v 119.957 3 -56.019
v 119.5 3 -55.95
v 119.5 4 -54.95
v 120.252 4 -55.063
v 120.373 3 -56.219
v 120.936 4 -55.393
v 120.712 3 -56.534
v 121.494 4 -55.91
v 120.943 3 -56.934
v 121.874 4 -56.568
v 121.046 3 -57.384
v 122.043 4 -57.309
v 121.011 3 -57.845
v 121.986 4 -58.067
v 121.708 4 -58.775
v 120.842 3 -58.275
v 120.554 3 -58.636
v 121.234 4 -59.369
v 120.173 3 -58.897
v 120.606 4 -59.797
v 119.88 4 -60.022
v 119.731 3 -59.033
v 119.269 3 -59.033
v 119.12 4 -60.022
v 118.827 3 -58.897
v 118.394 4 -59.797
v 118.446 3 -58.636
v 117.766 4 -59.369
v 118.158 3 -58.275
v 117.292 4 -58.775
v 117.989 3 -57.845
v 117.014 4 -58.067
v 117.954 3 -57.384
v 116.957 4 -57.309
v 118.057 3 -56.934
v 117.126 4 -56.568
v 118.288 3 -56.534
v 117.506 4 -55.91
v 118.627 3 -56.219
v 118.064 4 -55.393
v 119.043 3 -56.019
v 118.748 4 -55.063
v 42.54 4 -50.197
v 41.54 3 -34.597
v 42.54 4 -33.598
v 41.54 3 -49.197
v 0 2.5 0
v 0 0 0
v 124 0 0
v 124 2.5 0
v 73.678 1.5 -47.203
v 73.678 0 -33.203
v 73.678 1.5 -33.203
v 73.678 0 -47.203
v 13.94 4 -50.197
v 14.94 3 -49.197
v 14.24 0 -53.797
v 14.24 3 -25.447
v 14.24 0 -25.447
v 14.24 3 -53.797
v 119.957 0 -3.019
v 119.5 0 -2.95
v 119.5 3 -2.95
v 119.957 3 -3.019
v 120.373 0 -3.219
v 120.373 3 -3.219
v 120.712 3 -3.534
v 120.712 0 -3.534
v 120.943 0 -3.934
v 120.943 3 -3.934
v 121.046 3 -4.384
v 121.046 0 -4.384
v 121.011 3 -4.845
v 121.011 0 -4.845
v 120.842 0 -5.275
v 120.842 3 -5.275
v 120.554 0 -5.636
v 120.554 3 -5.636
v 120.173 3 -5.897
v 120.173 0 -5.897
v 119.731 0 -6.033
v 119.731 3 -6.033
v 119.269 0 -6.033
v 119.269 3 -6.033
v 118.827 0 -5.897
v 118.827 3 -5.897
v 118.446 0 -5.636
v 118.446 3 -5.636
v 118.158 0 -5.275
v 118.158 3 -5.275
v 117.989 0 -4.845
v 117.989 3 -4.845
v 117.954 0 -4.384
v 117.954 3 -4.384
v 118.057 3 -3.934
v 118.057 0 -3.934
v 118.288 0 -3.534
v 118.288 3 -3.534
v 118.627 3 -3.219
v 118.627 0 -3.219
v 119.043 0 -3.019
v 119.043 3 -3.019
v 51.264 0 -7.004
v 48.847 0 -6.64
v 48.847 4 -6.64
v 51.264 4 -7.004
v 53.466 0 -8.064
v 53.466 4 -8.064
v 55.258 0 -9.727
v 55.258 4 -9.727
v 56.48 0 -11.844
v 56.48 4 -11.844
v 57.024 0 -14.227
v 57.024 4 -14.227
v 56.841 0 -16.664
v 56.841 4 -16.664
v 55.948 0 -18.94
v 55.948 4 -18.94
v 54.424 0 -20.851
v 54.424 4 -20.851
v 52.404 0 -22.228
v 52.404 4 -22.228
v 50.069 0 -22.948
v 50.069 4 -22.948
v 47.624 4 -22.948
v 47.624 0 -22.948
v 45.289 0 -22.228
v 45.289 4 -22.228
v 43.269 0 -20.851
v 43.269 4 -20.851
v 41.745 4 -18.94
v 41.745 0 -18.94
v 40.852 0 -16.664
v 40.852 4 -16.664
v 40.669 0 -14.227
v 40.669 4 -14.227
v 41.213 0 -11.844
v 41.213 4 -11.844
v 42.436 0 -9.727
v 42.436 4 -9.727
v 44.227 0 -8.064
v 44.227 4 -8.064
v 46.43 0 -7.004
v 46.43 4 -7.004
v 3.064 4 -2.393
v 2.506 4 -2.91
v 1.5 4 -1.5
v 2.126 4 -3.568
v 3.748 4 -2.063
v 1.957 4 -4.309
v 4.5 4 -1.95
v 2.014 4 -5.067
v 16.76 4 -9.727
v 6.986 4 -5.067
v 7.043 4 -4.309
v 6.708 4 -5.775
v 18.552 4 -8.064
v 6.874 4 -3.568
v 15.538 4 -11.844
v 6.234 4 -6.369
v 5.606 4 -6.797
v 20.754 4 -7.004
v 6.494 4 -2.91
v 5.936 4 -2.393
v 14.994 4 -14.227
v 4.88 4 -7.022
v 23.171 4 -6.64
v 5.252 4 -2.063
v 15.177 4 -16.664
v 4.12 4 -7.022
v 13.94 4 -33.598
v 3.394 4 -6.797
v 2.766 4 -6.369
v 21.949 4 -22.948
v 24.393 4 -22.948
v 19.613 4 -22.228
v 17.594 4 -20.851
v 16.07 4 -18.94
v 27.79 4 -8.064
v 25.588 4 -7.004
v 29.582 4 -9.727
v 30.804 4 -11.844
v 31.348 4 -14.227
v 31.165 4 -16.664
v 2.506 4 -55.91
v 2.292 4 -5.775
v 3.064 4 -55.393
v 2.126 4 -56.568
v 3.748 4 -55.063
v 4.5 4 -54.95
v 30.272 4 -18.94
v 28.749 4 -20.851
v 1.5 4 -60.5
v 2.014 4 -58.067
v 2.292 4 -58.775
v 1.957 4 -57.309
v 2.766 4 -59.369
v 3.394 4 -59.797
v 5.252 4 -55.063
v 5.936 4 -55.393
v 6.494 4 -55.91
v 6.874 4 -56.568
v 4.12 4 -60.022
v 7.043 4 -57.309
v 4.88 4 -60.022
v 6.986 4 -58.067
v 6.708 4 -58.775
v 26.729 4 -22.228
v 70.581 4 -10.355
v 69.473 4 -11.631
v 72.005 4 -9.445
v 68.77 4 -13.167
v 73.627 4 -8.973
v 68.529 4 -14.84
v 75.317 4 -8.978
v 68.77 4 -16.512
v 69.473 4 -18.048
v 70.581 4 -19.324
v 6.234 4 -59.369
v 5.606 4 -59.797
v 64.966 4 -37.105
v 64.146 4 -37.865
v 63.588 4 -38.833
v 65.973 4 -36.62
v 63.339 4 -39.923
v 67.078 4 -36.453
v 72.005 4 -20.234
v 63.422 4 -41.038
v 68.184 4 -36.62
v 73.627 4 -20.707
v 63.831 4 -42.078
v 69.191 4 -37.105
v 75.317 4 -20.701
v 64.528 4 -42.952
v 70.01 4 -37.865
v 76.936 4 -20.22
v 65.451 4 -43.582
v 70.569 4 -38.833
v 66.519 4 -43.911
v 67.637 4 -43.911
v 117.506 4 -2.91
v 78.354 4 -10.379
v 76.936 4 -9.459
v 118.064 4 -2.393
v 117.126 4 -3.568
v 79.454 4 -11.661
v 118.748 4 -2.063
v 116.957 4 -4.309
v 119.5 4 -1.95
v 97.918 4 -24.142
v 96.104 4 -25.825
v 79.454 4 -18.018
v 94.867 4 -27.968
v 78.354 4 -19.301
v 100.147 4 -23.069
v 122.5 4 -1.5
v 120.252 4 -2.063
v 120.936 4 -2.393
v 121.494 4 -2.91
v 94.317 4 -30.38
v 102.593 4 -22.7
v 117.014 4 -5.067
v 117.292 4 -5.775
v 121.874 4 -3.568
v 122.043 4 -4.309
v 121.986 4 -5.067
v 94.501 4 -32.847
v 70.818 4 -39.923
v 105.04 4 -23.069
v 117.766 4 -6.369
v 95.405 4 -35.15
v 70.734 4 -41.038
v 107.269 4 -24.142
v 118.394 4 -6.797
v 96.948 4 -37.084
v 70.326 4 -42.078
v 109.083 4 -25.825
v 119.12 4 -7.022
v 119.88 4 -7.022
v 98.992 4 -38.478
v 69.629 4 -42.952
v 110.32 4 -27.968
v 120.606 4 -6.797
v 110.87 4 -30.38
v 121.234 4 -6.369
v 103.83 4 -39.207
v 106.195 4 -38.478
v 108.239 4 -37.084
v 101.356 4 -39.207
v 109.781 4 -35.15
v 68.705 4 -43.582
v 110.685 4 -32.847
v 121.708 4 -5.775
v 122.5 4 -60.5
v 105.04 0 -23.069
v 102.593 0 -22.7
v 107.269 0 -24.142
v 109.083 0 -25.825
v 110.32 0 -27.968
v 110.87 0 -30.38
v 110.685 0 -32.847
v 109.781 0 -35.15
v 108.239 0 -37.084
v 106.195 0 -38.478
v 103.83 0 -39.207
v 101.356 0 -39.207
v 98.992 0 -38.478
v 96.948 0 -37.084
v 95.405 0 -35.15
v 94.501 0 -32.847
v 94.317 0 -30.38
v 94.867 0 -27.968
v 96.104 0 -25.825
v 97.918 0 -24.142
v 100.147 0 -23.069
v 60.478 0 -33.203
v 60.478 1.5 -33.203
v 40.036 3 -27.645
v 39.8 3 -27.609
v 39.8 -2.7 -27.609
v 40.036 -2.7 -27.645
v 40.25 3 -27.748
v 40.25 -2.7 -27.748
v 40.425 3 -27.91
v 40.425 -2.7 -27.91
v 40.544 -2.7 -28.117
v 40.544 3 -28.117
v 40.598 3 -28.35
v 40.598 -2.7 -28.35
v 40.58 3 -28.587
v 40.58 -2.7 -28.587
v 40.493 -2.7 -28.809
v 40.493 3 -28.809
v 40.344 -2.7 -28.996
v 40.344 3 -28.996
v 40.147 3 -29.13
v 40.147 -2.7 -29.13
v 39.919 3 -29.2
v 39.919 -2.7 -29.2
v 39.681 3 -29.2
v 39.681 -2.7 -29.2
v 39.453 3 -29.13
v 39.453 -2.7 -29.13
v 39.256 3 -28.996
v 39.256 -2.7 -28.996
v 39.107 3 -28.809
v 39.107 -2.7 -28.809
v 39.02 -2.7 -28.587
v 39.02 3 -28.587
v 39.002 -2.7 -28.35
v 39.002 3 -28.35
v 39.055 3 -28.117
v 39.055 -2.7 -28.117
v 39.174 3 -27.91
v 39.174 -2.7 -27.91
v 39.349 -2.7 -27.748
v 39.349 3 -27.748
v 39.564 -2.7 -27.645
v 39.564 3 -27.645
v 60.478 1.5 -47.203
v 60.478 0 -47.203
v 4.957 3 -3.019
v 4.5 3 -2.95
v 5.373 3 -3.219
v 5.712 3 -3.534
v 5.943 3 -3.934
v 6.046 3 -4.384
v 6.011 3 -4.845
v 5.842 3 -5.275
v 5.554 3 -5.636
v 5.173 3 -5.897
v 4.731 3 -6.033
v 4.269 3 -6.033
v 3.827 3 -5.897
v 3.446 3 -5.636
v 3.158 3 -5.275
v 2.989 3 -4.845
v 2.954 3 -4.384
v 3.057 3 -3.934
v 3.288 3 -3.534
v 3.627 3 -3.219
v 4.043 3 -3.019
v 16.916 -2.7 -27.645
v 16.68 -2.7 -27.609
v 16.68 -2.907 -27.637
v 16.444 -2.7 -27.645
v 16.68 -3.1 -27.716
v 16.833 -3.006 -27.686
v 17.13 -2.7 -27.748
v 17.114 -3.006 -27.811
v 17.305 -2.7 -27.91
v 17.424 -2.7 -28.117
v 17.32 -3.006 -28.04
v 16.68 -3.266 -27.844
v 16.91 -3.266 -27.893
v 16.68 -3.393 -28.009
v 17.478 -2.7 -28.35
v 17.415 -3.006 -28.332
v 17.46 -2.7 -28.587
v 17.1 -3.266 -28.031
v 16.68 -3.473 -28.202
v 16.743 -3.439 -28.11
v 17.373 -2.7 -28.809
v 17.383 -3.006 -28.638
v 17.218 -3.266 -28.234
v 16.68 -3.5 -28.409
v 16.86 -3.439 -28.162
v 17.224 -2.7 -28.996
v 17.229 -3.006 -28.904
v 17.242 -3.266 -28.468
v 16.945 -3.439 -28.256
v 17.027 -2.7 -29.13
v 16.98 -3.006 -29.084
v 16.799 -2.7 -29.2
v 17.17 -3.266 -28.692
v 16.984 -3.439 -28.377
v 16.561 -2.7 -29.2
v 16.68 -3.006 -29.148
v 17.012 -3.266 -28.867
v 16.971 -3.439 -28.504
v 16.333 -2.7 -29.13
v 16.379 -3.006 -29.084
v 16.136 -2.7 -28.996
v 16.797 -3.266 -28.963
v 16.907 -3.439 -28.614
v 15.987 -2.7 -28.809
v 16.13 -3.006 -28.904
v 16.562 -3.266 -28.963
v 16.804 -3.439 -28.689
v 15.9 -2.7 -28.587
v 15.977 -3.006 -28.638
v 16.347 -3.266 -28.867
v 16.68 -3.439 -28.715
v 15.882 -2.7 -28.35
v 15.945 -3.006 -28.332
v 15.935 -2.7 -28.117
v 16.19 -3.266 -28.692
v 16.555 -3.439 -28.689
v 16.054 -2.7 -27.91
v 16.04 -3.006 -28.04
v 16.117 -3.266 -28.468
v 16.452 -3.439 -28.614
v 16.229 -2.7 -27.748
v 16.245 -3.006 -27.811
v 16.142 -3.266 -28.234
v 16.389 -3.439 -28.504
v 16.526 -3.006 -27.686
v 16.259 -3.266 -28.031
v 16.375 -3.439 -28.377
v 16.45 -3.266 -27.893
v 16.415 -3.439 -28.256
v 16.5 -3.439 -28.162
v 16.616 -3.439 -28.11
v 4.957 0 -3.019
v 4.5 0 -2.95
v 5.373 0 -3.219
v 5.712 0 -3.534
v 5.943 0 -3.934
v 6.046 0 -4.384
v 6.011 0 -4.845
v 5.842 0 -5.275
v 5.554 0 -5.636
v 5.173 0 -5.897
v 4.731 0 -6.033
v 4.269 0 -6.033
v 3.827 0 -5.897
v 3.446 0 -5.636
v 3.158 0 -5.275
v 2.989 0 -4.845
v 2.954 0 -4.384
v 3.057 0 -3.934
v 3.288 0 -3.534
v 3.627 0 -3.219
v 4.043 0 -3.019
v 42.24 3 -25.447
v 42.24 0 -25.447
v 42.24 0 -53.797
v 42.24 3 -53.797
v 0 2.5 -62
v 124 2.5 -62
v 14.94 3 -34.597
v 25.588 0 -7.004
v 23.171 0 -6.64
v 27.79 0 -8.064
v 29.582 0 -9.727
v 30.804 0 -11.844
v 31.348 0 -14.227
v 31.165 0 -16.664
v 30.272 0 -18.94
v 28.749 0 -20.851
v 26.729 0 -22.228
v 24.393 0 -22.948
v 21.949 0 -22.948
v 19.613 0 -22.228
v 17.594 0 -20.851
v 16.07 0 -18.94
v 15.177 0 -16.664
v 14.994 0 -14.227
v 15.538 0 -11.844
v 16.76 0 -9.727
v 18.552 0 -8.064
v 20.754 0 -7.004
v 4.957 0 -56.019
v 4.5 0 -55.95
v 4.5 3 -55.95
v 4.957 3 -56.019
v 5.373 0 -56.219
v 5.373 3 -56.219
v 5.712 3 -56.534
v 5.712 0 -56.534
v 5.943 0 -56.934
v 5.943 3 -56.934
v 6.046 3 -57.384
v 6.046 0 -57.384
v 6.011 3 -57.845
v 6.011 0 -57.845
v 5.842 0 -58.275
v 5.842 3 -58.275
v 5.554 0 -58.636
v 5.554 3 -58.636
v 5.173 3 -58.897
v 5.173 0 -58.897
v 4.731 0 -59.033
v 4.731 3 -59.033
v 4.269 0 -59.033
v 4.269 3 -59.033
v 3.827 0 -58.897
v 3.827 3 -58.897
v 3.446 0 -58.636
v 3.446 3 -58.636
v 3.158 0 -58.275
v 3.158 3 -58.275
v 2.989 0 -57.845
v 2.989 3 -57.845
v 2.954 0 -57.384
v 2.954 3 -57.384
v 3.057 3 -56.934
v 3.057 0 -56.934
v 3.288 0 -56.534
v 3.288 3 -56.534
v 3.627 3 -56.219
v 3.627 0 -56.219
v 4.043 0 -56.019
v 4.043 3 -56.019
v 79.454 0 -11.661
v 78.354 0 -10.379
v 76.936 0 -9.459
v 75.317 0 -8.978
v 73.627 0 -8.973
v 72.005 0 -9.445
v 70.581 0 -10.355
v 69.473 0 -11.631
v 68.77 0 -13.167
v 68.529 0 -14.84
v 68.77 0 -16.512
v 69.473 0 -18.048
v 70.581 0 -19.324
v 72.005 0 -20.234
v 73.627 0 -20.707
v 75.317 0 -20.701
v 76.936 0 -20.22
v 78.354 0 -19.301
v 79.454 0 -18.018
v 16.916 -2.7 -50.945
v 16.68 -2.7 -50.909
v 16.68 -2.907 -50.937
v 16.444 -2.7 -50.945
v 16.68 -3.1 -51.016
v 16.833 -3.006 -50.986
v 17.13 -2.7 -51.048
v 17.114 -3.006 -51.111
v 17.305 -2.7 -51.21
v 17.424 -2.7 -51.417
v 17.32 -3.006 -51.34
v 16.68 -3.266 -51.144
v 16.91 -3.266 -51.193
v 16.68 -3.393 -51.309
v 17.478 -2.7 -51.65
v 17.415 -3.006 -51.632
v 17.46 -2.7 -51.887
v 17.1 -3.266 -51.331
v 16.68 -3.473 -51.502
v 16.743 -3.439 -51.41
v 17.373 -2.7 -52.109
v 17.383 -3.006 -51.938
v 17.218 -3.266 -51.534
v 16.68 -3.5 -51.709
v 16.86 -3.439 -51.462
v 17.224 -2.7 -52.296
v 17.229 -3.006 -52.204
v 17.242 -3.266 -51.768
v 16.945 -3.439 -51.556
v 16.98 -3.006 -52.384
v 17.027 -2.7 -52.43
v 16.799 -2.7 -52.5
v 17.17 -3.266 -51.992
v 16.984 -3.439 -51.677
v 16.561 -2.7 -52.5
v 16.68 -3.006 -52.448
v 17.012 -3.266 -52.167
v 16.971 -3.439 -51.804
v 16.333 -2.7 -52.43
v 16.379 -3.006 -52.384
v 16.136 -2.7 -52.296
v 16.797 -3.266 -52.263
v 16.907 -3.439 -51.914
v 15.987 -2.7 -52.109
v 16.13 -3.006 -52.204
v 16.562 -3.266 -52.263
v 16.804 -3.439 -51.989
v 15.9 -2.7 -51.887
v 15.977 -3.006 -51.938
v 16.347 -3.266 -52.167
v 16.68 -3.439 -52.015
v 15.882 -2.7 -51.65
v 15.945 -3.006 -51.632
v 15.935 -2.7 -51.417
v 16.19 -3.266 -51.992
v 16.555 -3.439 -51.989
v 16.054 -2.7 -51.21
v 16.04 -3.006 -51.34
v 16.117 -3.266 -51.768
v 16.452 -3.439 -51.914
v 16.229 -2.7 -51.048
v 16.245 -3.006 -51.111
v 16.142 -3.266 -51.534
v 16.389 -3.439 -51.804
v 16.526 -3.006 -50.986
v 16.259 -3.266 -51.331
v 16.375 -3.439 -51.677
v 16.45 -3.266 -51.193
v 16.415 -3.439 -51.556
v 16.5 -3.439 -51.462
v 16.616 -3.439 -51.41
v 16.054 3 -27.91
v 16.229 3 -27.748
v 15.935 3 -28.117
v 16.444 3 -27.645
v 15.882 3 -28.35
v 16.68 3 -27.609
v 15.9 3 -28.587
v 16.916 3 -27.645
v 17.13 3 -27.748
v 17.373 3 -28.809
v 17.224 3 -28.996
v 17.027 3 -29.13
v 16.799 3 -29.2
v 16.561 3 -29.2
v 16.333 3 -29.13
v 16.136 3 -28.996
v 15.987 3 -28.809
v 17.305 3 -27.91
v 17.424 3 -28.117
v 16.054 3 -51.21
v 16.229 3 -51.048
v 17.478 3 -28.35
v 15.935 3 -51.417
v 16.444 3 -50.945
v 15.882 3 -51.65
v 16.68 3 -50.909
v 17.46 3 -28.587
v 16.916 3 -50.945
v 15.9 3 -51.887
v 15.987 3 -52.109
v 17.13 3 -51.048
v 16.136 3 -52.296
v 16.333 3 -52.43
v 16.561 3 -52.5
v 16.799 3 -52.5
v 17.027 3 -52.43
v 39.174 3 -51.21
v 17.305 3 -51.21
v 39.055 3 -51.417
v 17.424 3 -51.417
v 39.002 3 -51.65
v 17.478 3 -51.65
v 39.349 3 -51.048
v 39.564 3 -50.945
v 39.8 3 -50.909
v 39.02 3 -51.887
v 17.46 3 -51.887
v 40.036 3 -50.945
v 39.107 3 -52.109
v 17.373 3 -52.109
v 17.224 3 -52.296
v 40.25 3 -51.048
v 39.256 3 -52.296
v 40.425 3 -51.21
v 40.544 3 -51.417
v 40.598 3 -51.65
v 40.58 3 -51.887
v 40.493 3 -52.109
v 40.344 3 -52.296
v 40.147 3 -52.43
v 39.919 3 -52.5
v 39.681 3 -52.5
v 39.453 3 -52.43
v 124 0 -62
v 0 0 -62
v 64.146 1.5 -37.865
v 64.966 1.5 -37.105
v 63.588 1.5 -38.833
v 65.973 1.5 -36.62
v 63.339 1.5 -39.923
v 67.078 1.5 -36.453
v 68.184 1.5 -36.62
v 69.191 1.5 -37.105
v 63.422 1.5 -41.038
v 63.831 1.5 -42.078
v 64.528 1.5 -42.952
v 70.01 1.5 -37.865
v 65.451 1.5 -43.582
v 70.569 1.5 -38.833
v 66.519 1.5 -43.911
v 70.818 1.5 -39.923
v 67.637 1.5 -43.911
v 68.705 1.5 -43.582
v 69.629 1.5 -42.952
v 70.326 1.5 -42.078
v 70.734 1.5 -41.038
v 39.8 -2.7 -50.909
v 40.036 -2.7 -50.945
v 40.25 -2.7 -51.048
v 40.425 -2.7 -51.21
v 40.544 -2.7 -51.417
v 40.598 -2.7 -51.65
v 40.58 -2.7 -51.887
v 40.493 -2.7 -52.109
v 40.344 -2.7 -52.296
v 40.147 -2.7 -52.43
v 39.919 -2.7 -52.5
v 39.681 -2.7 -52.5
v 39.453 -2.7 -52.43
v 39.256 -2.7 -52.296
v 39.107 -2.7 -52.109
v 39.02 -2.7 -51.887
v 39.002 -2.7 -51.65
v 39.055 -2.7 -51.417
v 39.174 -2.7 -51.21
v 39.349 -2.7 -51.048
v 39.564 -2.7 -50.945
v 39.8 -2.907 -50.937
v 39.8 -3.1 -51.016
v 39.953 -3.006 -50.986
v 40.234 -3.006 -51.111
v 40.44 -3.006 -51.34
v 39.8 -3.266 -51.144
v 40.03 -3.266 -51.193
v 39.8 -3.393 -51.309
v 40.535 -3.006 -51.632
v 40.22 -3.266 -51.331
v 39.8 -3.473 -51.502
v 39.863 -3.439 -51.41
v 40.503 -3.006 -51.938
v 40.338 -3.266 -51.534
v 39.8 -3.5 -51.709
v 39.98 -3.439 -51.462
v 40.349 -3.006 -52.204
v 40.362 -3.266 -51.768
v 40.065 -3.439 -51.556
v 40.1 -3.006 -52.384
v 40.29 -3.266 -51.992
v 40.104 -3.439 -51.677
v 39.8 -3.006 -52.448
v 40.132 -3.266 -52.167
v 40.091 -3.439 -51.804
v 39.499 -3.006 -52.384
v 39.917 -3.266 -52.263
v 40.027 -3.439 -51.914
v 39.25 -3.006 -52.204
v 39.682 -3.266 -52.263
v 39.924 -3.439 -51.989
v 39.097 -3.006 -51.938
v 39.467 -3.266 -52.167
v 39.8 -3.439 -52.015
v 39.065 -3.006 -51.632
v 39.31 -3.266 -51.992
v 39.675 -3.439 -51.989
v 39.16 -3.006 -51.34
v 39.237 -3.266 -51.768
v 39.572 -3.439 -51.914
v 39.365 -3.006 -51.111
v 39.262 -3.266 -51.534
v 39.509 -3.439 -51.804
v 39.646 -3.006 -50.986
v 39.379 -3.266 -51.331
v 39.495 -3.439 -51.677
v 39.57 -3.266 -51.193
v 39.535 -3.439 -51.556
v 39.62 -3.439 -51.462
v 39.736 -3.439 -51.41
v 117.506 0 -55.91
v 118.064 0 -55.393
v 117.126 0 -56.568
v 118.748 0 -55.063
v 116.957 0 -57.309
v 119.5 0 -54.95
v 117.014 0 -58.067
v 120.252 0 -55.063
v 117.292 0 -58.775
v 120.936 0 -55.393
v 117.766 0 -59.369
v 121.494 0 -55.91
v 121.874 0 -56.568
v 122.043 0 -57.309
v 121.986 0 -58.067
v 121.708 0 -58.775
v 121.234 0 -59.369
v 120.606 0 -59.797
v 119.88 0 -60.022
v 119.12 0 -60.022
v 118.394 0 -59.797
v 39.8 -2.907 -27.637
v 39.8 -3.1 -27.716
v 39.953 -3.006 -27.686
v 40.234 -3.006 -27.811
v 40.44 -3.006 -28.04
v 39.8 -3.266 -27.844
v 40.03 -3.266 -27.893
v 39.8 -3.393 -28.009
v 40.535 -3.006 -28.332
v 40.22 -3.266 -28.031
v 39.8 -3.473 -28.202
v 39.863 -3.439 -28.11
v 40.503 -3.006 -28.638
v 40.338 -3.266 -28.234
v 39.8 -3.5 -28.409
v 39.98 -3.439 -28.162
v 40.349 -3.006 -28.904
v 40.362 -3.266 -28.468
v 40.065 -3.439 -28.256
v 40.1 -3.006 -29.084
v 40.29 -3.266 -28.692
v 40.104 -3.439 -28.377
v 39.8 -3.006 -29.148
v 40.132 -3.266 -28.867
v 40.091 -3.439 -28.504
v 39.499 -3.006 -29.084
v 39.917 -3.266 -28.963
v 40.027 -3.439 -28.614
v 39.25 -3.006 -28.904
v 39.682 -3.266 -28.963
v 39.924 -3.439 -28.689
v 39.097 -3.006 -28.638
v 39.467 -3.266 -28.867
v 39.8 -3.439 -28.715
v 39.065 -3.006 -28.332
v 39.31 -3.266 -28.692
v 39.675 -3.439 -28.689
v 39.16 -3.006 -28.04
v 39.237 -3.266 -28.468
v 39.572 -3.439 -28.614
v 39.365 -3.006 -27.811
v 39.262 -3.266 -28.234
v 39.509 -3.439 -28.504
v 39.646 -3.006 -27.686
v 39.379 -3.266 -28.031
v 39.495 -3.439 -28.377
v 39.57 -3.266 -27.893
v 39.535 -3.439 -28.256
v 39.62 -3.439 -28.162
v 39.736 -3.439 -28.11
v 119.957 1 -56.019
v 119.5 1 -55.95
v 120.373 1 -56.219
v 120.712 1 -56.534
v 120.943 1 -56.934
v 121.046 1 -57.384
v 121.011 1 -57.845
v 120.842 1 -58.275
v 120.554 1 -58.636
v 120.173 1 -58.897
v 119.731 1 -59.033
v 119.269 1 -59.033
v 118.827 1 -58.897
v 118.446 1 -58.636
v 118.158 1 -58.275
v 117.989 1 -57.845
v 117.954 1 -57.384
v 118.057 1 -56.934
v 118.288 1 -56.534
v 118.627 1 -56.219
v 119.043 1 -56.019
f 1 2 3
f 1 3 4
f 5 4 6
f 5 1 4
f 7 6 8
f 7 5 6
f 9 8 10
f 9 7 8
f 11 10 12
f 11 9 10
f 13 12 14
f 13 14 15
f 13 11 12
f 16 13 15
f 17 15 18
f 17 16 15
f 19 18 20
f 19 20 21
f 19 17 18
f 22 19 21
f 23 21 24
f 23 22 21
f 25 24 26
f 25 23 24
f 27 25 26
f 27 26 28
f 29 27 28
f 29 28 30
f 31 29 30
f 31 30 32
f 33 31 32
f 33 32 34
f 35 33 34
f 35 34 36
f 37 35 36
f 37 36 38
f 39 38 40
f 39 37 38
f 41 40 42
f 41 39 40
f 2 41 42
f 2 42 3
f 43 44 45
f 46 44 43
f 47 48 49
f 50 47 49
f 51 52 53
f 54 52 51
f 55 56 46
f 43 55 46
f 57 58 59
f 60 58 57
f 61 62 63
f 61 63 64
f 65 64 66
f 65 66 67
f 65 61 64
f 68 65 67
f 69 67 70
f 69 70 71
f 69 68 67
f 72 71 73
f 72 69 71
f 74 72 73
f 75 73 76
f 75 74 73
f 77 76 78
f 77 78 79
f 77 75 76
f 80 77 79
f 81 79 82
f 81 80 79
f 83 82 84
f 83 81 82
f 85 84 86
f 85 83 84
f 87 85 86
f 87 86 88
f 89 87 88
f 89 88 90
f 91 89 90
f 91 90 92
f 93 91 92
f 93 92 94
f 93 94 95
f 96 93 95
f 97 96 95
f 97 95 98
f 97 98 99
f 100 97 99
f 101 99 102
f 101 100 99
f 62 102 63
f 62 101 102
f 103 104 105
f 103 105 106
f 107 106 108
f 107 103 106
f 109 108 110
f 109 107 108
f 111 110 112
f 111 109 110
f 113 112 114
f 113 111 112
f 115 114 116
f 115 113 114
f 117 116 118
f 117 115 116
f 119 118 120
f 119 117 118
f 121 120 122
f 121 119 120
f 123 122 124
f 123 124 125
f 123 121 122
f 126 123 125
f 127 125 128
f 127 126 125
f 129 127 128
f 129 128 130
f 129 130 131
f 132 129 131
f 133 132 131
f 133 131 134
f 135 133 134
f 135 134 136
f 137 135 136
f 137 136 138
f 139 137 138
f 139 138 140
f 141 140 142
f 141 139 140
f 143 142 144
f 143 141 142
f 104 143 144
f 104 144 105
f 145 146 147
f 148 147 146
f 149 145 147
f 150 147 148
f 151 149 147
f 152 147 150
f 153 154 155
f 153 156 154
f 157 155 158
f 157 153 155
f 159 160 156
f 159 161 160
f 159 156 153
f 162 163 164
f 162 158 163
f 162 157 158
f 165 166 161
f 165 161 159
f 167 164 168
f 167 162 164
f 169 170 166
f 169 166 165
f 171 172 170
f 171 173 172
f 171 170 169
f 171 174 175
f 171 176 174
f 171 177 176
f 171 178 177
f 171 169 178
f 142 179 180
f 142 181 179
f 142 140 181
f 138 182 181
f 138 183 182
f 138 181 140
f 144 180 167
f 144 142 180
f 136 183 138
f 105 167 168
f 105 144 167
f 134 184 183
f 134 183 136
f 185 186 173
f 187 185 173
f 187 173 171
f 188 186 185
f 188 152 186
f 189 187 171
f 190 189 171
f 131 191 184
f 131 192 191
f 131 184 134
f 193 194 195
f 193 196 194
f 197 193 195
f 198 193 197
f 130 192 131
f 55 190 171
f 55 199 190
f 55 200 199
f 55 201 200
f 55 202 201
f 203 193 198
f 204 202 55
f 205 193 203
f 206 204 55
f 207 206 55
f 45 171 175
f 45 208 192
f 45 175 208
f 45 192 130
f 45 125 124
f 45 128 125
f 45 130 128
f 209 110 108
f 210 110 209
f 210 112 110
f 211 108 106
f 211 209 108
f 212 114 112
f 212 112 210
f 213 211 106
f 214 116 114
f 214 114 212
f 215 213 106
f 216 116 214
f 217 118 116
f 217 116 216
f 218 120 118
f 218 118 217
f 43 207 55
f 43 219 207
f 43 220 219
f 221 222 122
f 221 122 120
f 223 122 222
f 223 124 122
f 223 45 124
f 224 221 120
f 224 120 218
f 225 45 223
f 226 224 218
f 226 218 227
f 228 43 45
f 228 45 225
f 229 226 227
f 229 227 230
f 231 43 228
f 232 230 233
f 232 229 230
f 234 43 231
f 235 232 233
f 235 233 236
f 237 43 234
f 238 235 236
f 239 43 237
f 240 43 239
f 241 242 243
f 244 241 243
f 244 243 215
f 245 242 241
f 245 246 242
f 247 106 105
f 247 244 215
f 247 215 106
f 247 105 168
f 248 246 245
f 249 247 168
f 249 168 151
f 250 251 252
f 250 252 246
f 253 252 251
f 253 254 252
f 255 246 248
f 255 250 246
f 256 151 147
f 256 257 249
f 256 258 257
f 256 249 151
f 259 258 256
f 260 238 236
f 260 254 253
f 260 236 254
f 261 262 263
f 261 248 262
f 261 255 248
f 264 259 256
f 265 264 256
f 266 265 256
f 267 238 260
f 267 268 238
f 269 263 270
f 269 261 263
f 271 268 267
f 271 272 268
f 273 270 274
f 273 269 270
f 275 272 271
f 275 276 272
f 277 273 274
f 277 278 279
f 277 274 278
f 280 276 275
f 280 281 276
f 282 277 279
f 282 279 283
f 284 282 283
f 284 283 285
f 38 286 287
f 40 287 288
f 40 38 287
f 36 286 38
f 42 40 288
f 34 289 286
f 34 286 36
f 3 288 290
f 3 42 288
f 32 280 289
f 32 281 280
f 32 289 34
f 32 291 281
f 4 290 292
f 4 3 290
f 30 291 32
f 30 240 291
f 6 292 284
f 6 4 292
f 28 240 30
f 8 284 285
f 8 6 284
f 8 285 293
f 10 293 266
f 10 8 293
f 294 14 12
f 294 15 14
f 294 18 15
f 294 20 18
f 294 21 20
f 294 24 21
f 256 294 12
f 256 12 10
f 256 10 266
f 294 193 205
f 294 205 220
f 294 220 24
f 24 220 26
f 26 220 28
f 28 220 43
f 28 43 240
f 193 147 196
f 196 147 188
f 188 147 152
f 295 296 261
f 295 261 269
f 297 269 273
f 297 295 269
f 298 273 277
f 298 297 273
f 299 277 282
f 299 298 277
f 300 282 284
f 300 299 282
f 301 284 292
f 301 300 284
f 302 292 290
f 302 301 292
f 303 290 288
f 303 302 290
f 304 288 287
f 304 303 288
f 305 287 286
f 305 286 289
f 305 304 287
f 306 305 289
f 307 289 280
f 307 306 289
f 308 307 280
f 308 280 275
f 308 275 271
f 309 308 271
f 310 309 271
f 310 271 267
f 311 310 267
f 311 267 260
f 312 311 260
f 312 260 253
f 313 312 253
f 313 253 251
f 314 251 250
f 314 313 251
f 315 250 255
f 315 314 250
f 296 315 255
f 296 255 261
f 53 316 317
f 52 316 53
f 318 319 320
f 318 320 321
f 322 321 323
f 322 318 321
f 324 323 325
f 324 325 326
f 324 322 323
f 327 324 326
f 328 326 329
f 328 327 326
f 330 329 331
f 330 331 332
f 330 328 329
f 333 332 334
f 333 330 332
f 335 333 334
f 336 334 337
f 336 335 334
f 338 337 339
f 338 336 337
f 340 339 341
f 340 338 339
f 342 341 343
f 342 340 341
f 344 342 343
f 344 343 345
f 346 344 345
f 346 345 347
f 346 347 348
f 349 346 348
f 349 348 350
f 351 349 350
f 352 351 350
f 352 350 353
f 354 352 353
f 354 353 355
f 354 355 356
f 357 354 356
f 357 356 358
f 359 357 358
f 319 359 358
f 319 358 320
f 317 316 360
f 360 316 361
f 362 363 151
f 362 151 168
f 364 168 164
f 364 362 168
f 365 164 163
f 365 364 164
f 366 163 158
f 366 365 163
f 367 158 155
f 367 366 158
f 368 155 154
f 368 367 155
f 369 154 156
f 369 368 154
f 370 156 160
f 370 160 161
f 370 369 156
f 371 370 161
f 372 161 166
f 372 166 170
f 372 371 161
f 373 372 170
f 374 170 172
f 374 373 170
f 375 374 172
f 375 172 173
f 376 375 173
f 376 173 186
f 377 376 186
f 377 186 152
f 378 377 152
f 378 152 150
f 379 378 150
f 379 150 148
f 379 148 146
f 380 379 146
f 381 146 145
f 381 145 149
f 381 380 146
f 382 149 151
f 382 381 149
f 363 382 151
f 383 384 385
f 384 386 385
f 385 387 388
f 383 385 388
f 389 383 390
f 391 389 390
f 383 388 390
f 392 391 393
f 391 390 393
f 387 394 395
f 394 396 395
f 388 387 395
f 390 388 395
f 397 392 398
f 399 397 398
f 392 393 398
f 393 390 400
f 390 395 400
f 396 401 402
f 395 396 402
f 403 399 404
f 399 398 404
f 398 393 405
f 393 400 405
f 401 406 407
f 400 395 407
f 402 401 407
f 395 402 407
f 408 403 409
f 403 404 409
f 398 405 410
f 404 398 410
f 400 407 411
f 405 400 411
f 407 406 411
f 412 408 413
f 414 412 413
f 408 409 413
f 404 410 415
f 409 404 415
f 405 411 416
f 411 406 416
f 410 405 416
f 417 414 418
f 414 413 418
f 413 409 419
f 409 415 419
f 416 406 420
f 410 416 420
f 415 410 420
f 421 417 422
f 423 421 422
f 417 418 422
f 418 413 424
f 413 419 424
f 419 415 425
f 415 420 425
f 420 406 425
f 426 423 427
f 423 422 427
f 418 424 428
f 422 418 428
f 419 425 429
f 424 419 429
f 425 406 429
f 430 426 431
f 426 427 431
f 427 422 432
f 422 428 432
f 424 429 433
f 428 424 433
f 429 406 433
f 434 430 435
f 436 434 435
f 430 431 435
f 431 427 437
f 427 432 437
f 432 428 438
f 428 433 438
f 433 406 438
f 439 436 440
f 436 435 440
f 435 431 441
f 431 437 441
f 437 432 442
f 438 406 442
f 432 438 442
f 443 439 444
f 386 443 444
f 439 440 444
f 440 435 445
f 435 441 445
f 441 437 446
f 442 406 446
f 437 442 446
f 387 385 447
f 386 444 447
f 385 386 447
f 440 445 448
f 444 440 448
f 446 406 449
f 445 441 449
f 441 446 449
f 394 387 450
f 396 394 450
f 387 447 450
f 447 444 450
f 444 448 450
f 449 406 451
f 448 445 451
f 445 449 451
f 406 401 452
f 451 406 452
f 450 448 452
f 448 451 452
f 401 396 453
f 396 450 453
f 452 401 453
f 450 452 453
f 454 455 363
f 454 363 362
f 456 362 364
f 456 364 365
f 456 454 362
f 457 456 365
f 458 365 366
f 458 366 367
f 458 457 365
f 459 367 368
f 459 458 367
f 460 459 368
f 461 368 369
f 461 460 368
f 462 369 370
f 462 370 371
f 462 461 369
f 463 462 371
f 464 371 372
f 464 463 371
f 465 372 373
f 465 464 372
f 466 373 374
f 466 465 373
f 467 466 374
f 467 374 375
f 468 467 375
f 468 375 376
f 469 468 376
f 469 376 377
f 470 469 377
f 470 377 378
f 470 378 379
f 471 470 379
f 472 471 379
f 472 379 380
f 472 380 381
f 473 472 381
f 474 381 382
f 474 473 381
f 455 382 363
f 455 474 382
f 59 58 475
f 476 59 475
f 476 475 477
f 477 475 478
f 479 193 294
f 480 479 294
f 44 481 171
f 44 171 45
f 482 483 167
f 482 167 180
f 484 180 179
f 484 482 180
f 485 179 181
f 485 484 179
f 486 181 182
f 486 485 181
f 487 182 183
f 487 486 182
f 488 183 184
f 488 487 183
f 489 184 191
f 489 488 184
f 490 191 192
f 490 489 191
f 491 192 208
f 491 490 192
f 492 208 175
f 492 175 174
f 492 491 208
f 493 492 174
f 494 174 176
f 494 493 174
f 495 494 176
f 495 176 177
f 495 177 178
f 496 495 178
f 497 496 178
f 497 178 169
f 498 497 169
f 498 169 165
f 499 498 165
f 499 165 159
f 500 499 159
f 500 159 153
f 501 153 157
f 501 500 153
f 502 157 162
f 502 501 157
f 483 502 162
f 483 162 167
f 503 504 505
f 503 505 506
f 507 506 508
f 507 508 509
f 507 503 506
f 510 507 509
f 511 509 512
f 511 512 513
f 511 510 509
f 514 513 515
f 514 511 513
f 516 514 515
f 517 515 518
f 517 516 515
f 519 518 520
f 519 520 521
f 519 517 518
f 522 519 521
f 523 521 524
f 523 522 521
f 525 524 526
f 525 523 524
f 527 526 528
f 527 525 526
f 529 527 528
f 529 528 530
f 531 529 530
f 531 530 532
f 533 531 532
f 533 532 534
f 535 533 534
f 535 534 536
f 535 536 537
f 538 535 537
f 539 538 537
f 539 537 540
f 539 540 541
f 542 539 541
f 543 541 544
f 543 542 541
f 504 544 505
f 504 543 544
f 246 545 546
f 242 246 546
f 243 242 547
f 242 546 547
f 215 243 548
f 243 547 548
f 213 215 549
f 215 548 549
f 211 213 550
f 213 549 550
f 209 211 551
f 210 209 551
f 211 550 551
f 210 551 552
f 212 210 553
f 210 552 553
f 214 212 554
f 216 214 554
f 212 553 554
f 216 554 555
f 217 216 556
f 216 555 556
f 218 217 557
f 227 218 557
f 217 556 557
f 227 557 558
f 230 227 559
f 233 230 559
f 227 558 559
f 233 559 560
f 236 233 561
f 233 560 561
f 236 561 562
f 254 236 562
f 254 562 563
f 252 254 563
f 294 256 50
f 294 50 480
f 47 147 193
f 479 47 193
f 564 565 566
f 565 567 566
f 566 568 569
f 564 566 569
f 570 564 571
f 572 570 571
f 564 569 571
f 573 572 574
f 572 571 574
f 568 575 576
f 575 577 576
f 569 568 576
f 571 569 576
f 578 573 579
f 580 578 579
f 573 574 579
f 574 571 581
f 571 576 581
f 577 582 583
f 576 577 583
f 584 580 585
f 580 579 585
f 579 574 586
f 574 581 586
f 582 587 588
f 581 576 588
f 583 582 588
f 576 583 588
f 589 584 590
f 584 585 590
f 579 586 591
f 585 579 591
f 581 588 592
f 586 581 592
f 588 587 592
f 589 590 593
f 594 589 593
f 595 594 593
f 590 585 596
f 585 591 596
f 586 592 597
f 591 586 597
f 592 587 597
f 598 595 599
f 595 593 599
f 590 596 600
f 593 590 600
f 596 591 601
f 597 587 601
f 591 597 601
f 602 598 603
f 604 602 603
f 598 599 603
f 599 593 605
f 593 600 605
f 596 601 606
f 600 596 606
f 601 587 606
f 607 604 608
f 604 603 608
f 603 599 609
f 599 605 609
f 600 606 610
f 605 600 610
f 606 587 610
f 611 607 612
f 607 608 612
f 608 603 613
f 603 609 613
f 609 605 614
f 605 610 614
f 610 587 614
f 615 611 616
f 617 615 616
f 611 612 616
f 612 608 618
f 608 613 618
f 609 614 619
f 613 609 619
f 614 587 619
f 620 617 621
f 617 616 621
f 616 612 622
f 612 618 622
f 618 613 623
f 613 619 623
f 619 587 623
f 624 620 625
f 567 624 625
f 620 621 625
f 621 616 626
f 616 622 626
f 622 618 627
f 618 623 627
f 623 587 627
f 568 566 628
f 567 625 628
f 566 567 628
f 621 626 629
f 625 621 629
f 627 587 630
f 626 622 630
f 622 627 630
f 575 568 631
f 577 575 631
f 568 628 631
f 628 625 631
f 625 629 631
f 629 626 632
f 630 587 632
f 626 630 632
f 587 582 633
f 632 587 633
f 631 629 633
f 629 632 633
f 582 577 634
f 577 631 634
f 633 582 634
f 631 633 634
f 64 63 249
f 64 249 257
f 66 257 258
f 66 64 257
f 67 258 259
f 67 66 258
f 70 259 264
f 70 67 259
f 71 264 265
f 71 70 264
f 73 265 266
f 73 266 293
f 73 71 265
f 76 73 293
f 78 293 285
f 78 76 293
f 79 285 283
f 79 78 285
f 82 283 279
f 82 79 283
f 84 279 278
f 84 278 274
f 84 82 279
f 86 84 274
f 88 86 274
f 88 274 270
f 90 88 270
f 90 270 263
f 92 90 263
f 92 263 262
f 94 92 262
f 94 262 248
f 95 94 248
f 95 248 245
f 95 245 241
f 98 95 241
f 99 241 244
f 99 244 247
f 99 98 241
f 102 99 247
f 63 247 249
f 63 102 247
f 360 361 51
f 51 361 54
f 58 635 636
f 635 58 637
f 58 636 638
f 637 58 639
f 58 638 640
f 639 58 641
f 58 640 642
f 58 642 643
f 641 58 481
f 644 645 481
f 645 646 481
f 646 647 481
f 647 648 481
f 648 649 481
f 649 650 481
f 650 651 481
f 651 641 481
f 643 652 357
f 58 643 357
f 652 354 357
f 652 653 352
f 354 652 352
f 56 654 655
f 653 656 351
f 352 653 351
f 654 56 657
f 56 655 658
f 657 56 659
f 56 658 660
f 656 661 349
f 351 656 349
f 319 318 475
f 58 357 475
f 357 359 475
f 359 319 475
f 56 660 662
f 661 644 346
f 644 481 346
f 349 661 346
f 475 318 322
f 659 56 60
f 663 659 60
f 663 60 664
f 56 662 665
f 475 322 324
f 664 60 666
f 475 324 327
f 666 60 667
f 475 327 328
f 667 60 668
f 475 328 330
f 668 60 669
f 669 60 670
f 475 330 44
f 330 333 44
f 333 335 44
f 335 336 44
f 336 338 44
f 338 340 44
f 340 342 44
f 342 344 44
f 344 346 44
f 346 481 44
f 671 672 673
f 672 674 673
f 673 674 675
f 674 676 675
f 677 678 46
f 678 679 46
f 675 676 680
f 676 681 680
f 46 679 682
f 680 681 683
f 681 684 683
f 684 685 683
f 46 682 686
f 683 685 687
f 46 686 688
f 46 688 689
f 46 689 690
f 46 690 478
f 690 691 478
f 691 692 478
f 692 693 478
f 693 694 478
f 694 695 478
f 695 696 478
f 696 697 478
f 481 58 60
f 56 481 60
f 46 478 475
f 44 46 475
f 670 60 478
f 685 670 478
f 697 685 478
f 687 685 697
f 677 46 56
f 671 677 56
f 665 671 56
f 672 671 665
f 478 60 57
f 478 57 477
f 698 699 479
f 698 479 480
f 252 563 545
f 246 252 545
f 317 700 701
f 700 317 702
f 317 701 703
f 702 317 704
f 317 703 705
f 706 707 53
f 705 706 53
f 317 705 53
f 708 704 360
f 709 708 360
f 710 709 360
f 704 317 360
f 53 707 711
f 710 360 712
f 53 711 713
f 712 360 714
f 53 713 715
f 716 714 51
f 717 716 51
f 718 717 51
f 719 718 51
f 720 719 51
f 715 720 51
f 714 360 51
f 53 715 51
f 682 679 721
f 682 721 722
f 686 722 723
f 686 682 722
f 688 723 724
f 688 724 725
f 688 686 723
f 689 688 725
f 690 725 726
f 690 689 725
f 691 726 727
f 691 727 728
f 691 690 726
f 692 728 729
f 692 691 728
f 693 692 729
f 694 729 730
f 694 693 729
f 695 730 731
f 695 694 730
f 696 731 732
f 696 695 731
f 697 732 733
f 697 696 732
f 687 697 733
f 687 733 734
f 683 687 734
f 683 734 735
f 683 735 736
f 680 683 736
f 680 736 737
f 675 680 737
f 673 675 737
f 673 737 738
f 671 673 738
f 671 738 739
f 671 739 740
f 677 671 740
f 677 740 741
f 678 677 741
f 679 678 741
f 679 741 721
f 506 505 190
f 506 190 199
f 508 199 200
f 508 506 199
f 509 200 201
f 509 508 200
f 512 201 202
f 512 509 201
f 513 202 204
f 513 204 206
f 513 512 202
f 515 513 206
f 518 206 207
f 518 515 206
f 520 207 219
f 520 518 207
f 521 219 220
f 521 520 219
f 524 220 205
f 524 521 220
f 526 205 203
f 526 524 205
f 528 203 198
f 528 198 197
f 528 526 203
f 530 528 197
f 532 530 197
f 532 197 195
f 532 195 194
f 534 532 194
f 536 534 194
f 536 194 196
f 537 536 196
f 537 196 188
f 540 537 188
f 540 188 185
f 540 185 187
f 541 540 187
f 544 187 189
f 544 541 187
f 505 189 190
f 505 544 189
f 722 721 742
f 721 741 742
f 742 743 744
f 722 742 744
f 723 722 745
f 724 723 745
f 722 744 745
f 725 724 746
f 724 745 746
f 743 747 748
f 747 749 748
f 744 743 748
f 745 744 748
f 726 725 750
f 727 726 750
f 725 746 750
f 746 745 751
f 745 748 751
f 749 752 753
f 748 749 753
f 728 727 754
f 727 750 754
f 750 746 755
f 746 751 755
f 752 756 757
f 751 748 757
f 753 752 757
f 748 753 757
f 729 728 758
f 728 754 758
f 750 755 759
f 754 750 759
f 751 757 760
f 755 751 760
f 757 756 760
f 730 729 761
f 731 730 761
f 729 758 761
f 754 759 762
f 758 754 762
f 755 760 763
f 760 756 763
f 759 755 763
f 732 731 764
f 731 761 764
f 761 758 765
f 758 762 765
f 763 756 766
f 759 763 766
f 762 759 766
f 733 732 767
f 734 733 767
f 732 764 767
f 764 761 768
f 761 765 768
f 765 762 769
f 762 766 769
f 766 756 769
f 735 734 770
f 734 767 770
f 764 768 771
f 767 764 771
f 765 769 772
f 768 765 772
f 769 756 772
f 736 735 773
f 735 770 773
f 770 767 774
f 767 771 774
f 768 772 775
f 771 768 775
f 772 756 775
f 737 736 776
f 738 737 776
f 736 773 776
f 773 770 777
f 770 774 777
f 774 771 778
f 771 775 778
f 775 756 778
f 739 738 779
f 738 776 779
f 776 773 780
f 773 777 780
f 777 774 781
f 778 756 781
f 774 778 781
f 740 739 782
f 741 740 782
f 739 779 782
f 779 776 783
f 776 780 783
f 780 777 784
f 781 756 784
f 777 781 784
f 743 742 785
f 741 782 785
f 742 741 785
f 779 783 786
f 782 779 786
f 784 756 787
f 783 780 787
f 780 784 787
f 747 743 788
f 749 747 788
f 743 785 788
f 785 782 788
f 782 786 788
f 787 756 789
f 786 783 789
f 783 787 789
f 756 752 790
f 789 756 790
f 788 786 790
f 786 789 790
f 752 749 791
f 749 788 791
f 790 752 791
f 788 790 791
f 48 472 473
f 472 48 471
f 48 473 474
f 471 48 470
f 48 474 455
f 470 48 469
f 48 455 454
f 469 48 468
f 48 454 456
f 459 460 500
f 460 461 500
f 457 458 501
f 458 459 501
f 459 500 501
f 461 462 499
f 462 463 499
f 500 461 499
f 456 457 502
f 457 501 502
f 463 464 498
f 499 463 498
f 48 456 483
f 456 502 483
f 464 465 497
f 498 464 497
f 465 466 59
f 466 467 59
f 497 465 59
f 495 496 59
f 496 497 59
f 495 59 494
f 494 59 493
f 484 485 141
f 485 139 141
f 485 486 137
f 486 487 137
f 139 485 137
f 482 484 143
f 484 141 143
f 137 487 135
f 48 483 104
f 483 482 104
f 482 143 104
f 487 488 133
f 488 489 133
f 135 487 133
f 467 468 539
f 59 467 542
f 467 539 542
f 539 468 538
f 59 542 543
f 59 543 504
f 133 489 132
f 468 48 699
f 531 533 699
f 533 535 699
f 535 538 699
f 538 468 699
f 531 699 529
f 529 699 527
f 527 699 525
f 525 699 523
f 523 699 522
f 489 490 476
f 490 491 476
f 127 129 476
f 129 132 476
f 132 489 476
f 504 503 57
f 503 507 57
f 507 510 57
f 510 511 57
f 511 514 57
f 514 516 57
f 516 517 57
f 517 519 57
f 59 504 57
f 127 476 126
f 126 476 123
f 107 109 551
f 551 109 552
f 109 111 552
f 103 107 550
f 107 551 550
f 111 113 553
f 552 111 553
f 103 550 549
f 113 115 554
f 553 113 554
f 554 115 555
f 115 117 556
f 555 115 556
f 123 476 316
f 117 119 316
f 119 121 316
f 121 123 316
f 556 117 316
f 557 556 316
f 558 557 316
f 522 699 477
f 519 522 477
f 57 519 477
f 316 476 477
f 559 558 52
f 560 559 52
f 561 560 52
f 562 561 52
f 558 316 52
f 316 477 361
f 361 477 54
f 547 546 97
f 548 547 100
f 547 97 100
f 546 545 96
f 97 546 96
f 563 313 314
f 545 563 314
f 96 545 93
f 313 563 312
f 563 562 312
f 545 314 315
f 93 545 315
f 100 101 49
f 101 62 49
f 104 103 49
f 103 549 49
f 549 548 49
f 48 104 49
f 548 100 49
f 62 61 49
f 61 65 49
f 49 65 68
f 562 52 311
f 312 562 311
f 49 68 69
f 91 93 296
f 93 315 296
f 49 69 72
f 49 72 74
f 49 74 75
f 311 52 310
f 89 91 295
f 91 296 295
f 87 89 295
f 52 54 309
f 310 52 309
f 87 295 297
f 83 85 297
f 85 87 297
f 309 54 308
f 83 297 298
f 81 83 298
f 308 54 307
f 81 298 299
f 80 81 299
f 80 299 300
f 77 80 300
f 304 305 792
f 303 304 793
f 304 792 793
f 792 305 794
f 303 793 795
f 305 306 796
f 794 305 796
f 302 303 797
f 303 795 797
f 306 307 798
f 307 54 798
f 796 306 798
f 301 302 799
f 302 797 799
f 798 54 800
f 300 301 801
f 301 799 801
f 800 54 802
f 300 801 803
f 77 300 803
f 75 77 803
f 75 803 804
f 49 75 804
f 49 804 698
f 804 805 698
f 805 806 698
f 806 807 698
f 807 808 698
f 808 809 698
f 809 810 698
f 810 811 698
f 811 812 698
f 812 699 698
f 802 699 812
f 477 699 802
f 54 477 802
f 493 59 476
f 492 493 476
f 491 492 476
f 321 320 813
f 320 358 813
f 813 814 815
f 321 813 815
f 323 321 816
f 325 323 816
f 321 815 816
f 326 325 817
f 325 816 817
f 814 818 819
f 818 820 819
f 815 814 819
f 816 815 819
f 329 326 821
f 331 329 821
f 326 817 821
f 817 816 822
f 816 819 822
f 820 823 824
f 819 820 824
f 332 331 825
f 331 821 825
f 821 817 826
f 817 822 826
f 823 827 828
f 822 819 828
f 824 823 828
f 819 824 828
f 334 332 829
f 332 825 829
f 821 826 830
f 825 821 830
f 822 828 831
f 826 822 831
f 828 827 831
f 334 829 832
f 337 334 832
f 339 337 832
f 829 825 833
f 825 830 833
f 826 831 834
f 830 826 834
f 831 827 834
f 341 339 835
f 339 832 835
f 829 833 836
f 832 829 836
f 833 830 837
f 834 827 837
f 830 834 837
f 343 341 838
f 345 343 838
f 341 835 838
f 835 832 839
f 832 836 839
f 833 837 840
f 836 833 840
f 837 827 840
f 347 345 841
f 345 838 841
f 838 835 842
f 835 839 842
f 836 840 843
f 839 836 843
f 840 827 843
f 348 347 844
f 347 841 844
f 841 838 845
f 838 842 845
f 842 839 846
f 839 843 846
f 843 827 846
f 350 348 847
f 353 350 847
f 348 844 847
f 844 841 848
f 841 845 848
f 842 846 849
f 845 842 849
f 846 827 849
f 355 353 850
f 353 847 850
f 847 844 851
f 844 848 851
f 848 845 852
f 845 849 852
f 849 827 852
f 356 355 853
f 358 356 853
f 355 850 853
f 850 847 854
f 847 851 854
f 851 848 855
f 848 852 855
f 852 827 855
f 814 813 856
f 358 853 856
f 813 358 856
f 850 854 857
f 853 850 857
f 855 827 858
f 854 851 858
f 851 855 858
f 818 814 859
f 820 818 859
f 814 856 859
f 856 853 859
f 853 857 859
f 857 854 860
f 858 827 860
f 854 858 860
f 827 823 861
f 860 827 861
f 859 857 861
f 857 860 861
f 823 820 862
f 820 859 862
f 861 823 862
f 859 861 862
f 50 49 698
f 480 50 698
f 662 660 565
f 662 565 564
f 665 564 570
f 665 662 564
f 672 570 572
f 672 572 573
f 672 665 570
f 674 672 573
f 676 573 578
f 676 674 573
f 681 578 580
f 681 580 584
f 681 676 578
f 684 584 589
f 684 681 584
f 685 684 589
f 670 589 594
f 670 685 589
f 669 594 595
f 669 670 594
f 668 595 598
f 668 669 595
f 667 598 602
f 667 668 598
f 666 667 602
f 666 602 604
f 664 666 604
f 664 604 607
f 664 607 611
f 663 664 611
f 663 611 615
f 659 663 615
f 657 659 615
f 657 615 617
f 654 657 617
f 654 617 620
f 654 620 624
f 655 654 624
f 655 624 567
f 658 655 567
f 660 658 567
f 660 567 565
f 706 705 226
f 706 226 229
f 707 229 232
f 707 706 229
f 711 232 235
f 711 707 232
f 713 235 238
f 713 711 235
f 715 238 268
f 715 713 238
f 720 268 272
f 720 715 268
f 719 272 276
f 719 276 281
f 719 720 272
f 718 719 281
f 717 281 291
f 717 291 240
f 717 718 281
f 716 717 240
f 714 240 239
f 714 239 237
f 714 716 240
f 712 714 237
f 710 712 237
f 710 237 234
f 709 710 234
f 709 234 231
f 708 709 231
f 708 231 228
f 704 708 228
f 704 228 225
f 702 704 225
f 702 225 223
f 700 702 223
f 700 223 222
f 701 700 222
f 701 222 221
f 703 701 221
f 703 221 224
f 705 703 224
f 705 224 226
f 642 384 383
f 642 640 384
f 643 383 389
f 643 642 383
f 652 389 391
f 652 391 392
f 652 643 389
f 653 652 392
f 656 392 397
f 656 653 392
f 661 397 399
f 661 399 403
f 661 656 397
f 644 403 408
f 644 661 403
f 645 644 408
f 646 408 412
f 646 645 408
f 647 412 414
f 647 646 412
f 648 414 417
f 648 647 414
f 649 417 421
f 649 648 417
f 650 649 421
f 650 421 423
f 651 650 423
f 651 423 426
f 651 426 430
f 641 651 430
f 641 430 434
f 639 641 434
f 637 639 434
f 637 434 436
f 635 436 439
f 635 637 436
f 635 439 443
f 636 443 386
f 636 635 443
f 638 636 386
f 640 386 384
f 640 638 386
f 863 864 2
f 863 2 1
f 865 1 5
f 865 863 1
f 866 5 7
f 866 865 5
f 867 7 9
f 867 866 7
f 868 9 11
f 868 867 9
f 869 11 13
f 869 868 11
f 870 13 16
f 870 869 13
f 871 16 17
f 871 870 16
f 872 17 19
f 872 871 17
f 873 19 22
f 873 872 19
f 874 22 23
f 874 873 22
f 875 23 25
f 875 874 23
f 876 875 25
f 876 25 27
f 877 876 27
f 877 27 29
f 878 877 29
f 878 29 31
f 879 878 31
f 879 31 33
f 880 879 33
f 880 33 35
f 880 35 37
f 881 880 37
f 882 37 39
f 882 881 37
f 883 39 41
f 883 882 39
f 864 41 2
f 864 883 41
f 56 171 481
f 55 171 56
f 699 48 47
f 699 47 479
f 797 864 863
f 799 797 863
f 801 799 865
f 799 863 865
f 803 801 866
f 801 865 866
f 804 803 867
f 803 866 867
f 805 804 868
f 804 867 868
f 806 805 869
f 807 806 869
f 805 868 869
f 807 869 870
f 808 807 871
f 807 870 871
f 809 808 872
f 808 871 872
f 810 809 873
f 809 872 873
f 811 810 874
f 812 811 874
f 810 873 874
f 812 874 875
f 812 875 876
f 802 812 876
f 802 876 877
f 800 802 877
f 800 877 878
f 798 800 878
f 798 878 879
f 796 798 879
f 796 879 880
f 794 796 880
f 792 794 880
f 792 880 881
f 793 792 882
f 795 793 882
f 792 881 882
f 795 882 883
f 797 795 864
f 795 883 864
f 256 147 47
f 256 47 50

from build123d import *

# Parameters (mm, degrees)
SKETCH2_W           = 124
SKETCH2_H           = 62
SKETCH2_R           = 1.55
SKETCH2_W_2         = 26.6
SKETCH2_H_2         = 14.6
SKETCH2_R_2         = 3.75
SKETCH2_R_3         = 8.3
SKETCH2_R_4         = 8.2
BOSS_EXTRUDE1_DEPTH = 4
CHAMFER1_SIZE       = 1.5
CHAMFER2_SIZE       = 1
SKETCH2_3_R         = 0.8
BOSS_EXTRUDE2_DEPTH = 3.5
FILLET1_R           = 0.8
CUT_EXTRUDE1_START  = 3
SKETCH2_4_W         = 28
SKETCH2_4_H         = 28.35
SKETCH2_4_R         = 0.8
SKETCH2_4_W_2       = 26.6
SKETCH2_4_H_2       = 14.6
CUT_EXTRUDE1_DEPTH  = 3
CHAMFER3_SIZE       = 1
SKETCH2_5_W         = 13.2
SKETCH2_5_H         = 14
CUT_EXTRUDE4_DEPTH  = 1.5


with BuildPart() as part:
    # Sketch2 → Boss-Extrude1 (new body)
    with BuildSketch(Plane(origin=(0, 0, 0), x_dir=(1, 0, 0), z_dir=(0, 1, 0))):
        with Locations((62, 31)):
            Rectangle(SKETCH2_W, SKETCH2_H)
        with Locations(Location((4.5, 4.5, 0), (0, 0, 270))):
            Circle(SKETCH2_R, mode=Mode.SUBTRACT)
        with Locations(Location((119.5, 4.5, 0), (0, 0, 270))):
            Circle(SKETCH2_R, mode=Mode.SUBTRACT)
        with Locations((28.239743387, 41.89740921)):
            Rectangle(SKETCH2_W_2, SKETCH2_H_2, mode=Mode.SUBTRACT)
        with Locations(Location((4.5, 57.5, 0), (0, 0, 270))):
            Circle(SKETCH2_R, mode=Mode.SUBTRACT)
        with Locations(Location((67.078277823, 40.203161161, 0), (0, 0, 270))):
            Circle(SKETCH2_R_2, mode=Mode.SUBTRACT)
        with Locations(Location((119.5, 57.5, 0), (0, 0, 270))):
            Circle(SKETCH2_R, mode=Mode.SUBTRACT)
        with Locations(Location((102.593331931, 31, 0), (0, 0, 270))):
            Circle(SKETCH2_R_3, mode=Mode.SUBTRACT)
        with BuildLine():
            ThreePointArc((79.454234541, 11.660627935), (68.529234541, 14.839562505), (79.454234541, 18.018497075))
            Line((79.454234541, 18.018497075), (79.454234541, 11.660627935))
        make_face(mode=Mode.SUBTRACT)
        with Locations(Location((48.846547615, 14.839562505, 0), (0, 0, 270))):
            Circle(SKETCH2_R_4, mode=Mode.SUBTRACT)
        with Locations(Location((23.171087178, 14.839562505, 0), (0, 0, 270))):
            Circle(SKETCH2_R_4, mode=Mode.SUBTRACT)
    extrude(amount=BOSS_EXTRUDE1_DEPTH)

    # Chamfer1
    chamfer1_edges = [part.edges().sort_by_distance(p)[0] for p in [
        (62, 4, 0),
        (124, 4, -31),
        (62, 4, -62),
        (0, 4, -31),
    ]]
    chamfer(chamfer1_edges, length=CHAMFER1_SIZE)

    # Chamfer2
    chamfer2_edges = [part.edges().sort_by_distance(p)[0] for p in [
        (119.5, 0, -59.05),
        (4.5, 4, -6.05),
        (119.5, 4, -59.05),
        (119.5, 4, -6.05),
        (4.5, 4, -59.05),
    ]]
    chamfer(chamfer2_edges, length=CHAMFER2_SIZE)

    # Sketch2<3> → Boss-Extrude2 (add)
    with BuildSketch(Plane(origin=(0, 0, 0), x_dir=(1, 0, 0), z_dir=(0, 1, 0))):
        with Locations(Location((16.679743387, 28.409287577, 0), (0, 0, 270))):
            Circle(SKETCH2_3_R)
        with Locations(Location((16.679743387, 51.709287577, 0), (0, 0, 270))):
            Circle(SKETCH2_3_R)
        with Locations(Location((39.799743387, 28.409287577, 0), (0, 0, 270))):
            Circle(SKETCH2_3_R)
        with Locations(Location((39.799743387, 51.709287577, 0), (0, 0, 270))):
            Circle(SKETCH2_3_R)
    extrude(amount=-BOSS_EXTRUDE2_DEPTH)

    # Fillet1
    fillet1_edges = [part.edges().sort_by_distance(p)[0] for p in [
        (39.799743387, -3.5, -29.209287577),
        (39.799743387, -3.5, -52.509287577),
        (16.679743387, -3.5, -29.209287577),
        (16.679743387, -3.5, -52.509287577),
    ]]
    fillet(fillet1_edges, radius=FILLET1_R)

    # Sketch2<4> → Cut-Extrude1 (cut)
    with BuildSketch(Plane(origin=(0, 0, 0), x_dir=(1, 0, 0), z_dir=(0, 1, 0)).offset(CUT_EXTRUDE1_START)):
        with Locations((28.239743387, 39.62240921)):
            Rectangle(SKETCH2_4_W, SKETCH2_4_H)
        with Locations(Location((16.679743387, 51.709287577, 0), (0, 0, 270))):
            Circle(SKETCH2_4_R, mode=Mode.SUBTRACT)
        with Locations(Location((16.679743387, 28.409287577, 0), (0, 0, 270))):
            Circle(SKETCH2_4_R, mode=Mode.SUBTRACT)
        with Locations(Location((39.799743387, 28.409287577, 0), (0, 0, 270))):
            Circle(SKETCH2_4_R, mode=Mode.SUBTRACT)
        with Locations(Location((39.799743387, 51.709287577, 0), (0, 0, 270))):
            Circle(SKETCH2_4_R, mode=Mode.SUBTRACT)
        with Locations((28.239743387, 41.89740921)):
            Rectangle(SKETCH2_4_W_2, SKETCH2_4_H_2, mode=Mode.SUBTRACT)
    extrude(amount=-CUT_EXTRUDE1_DEPTH, mode=Mode.SUBTRACT)

    # Chamfer3
    chamfer3_edges = [part.edges().sort_by_distance(p)[0] for p in [
        (28.239743387, 4, -34.59740921),
        (41.539743387, 4, -41.89740921),
        (14.939743387, 4, -41.89740921),
        (28.239743387, 4, -49.19740921),
    ]]
    chamfer(chamfer3_edges, length=CHAMFER3_SIZE - 0.0001)  # a hair under: the kernel refuses the full size

    # Sketch2<5> → Cut-Extrude4 (cut)
    with BuildSketch(Plane(origin=(0, 0, 0), x_dir=(1, 0, 0), z_dir=(0, 1, 0))):
        with Locations((67.078277823, 40.203161161)):
            Rectangle(SKETCH2_5_W, SKETCH2_5_H)
    extrude(amount=CUT_EXTRUDE4_DEPTH, mode=Mode.SUBTRACT)


solid = part.part
